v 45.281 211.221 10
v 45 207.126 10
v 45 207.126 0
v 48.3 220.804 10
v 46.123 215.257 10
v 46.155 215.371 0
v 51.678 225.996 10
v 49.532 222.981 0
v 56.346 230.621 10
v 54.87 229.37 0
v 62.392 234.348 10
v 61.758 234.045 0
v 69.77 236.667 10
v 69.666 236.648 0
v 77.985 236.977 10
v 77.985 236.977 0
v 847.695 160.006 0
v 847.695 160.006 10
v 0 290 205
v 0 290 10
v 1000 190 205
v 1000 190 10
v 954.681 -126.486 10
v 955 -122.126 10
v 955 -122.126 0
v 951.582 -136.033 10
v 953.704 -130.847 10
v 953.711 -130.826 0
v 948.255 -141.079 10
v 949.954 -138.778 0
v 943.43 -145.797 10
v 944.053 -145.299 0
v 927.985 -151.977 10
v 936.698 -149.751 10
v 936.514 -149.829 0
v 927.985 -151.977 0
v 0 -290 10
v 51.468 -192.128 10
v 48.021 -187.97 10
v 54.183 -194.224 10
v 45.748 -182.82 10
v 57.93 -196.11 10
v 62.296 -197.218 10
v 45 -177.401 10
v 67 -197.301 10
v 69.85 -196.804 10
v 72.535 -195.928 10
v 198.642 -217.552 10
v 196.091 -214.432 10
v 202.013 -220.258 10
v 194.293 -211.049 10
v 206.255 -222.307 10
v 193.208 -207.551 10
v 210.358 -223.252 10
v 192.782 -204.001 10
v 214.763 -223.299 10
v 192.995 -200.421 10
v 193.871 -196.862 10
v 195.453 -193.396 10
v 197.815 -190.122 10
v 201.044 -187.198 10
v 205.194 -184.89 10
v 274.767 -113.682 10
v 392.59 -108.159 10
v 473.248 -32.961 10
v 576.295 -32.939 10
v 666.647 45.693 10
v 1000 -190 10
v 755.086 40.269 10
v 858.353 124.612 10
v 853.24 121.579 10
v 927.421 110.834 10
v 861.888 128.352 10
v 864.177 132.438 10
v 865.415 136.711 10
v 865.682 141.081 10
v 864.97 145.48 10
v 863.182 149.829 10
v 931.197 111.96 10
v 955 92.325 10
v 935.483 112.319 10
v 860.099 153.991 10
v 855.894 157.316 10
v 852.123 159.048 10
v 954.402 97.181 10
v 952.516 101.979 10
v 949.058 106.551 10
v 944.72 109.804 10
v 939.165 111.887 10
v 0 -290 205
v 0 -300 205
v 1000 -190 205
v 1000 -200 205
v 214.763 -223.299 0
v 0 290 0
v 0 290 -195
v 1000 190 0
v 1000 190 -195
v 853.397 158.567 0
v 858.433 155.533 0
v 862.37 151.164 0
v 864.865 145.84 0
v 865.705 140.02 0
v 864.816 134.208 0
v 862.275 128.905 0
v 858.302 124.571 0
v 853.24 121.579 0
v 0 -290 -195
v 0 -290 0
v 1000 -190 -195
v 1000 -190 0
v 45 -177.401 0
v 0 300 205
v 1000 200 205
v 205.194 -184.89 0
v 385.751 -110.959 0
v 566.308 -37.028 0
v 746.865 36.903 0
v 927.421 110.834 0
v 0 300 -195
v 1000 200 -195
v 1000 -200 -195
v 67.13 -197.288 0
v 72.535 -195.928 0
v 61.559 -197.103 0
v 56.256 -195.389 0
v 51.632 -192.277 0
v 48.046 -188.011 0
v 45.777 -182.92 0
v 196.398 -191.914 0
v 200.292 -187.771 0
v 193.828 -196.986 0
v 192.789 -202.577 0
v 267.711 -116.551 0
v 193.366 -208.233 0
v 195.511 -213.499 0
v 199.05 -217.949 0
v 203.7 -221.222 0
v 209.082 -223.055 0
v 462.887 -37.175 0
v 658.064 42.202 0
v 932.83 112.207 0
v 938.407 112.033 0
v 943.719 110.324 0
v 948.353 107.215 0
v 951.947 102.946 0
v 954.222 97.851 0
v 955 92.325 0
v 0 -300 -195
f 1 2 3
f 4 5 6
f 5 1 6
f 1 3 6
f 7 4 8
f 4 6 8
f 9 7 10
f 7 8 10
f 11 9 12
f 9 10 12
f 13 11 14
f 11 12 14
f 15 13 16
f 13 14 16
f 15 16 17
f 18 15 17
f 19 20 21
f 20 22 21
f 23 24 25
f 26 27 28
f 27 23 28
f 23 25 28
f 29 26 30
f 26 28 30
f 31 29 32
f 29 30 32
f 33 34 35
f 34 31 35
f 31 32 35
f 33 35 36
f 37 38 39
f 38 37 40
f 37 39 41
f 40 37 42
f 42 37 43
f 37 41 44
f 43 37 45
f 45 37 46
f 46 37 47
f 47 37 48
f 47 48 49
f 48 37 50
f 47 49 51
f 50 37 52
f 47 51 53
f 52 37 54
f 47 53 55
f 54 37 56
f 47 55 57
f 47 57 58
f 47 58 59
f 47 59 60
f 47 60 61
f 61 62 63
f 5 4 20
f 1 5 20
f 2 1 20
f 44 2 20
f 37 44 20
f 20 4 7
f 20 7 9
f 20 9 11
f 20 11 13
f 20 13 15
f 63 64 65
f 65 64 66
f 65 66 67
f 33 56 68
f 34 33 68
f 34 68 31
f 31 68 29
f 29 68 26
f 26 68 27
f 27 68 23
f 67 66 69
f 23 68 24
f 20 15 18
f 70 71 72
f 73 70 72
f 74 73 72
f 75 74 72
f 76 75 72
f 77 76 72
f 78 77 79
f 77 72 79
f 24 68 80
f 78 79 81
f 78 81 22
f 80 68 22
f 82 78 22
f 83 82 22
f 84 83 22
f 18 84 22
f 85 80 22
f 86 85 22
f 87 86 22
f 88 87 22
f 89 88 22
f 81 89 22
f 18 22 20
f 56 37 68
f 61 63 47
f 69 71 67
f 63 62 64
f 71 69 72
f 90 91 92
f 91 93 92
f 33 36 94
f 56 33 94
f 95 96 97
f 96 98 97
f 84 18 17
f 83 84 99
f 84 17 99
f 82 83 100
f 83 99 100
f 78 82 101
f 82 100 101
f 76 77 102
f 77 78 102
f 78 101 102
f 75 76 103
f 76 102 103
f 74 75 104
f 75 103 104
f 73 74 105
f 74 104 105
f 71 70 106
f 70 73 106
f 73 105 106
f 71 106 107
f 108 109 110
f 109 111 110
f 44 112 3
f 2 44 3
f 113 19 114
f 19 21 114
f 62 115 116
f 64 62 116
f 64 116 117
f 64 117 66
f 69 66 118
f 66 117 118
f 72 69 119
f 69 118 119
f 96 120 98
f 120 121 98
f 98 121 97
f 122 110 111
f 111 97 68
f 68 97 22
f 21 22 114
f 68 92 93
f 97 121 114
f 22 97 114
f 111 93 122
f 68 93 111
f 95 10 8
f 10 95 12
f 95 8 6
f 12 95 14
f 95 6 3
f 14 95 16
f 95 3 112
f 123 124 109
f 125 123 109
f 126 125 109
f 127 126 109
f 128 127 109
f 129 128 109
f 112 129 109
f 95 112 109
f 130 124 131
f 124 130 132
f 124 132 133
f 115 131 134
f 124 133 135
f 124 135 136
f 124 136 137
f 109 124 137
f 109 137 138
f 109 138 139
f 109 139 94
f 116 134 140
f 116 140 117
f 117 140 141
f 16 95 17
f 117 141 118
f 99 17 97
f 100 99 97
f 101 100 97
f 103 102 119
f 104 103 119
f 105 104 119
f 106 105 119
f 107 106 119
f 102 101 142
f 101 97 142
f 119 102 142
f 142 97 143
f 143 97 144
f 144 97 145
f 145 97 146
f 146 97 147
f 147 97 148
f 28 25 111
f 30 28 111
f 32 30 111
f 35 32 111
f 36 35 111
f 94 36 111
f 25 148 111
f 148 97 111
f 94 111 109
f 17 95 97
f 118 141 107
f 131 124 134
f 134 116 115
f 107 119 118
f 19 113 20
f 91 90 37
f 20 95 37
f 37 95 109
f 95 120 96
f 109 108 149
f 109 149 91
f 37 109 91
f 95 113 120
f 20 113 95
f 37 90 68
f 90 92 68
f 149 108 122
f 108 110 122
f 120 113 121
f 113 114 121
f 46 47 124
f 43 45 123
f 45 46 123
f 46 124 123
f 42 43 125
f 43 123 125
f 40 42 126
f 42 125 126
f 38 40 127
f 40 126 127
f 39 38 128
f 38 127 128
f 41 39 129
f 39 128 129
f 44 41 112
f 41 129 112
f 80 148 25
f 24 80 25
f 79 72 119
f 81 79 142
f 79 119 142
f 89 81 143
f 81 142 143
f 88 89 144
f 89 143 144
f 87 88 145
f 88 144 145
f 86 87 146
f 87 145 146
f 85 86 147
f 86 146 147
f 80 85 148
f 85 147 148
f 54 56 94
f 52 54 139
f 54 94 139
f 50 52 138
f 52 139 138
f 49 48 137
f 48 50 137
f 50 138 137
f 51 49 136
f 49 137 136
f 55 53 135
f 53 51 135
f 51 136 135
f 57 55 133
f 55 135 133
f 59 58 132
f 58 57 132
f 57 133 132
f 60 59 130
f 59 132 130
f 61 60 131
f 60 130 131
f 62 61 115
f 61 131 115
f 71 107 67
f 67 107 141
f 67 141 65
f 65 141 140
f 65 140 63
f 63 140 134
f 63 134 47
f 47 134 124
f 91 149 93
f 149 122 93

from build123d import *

# Parameters (mm, degrees)
CUT_EXTRUDE2_DEPTH = 1076.127215203


with BuildPart() as part:
    # Sketch1 → Loft4 section 0
    with BuildSketch(Plane(origin=(0, 0, 0), x_dir=(0, 0, -1), z_dir=(1, 0, 0))):
        Polygon((-205, 300), (195, 300), (195, 290), (0, 290), (0, -290), (195, -290), (195, -300), (-205, -300), (-205, -290), (-10, -290), (-10, 290), (-205, 290), align=None)
    # Sketch4 → Loft4 section 1
    with BuildSketch(Plane(origin=(1000, 0, -1000), x_dir=(0, 0, 1), z_dir=(-1, 0, 0))):
        Polygon((805, 200), (1205, 200), (1205, 190), (1010, 190), (1010, -190), (1205, -190), (1205, -200), (805, -200), (805, -190), (1000, -190), (1000, 190), (805, 190), align=None)
    loft()

    # 3DSketch1 → Cut-Extrude2 (cut, through all)
    with BuildSketch(Plane(origin=(955, -149.275559705, 0), x_dir=(-0.9193091385176674, 0.39353615823441734, 0), z_dir=(0, 0, 1))):
        with BuildLine():
            Line((23.771900268, 13.114838789), (651.375957176, 359.360866092))
            ThreePointArc((651.375957176, 359.360866092), (676.975392867, 353.930952286), (675.287892891, 327.816446442))
            Line((675.287892891, 327.816446442), (127.715549412, -228.2676011))
            ThreePointArc((127.715549412, -228.2676011), (109.754280938, -233.887743911), (95.078586754, -222.105674031))
            Line((95.078586754, -222.105674031), (10.684359853, -24.958900083))
            ThreePointArc((10.684359853, -24.958900083), (9.89296563, -3.400627082), (23.771900268, 13.114838789))
        make_face()
        with BuildLine():
            Line((825.502793093, 383.974217556), (976.828190217, 30.474754914))
            ThreePointArc((976.828190217, 30.474754914), (976.508407209, 6.141893153), (958.252169109, -9.948482636))
            Line((958.252169109, -9.948482636), (220.359519027, -242.09716271))
            ThreePointArc((220.359519027, -242.09716271), (197.283607657, -233.434785068), (200.139914384, -208.95262863))
            Line((200.139914384, -208.95262863), (792.899174378, 390.169926603))
            ThreePointArc((792.899174378, 390.169926603), (810.850417384, 395.751870528), (825.502793093, 383.974217556))
        make_face()
    extrude(amount=CUT_EXTRUDE2_DEPTH, mode=Mode.SUBTRACT)


solid = part.part
